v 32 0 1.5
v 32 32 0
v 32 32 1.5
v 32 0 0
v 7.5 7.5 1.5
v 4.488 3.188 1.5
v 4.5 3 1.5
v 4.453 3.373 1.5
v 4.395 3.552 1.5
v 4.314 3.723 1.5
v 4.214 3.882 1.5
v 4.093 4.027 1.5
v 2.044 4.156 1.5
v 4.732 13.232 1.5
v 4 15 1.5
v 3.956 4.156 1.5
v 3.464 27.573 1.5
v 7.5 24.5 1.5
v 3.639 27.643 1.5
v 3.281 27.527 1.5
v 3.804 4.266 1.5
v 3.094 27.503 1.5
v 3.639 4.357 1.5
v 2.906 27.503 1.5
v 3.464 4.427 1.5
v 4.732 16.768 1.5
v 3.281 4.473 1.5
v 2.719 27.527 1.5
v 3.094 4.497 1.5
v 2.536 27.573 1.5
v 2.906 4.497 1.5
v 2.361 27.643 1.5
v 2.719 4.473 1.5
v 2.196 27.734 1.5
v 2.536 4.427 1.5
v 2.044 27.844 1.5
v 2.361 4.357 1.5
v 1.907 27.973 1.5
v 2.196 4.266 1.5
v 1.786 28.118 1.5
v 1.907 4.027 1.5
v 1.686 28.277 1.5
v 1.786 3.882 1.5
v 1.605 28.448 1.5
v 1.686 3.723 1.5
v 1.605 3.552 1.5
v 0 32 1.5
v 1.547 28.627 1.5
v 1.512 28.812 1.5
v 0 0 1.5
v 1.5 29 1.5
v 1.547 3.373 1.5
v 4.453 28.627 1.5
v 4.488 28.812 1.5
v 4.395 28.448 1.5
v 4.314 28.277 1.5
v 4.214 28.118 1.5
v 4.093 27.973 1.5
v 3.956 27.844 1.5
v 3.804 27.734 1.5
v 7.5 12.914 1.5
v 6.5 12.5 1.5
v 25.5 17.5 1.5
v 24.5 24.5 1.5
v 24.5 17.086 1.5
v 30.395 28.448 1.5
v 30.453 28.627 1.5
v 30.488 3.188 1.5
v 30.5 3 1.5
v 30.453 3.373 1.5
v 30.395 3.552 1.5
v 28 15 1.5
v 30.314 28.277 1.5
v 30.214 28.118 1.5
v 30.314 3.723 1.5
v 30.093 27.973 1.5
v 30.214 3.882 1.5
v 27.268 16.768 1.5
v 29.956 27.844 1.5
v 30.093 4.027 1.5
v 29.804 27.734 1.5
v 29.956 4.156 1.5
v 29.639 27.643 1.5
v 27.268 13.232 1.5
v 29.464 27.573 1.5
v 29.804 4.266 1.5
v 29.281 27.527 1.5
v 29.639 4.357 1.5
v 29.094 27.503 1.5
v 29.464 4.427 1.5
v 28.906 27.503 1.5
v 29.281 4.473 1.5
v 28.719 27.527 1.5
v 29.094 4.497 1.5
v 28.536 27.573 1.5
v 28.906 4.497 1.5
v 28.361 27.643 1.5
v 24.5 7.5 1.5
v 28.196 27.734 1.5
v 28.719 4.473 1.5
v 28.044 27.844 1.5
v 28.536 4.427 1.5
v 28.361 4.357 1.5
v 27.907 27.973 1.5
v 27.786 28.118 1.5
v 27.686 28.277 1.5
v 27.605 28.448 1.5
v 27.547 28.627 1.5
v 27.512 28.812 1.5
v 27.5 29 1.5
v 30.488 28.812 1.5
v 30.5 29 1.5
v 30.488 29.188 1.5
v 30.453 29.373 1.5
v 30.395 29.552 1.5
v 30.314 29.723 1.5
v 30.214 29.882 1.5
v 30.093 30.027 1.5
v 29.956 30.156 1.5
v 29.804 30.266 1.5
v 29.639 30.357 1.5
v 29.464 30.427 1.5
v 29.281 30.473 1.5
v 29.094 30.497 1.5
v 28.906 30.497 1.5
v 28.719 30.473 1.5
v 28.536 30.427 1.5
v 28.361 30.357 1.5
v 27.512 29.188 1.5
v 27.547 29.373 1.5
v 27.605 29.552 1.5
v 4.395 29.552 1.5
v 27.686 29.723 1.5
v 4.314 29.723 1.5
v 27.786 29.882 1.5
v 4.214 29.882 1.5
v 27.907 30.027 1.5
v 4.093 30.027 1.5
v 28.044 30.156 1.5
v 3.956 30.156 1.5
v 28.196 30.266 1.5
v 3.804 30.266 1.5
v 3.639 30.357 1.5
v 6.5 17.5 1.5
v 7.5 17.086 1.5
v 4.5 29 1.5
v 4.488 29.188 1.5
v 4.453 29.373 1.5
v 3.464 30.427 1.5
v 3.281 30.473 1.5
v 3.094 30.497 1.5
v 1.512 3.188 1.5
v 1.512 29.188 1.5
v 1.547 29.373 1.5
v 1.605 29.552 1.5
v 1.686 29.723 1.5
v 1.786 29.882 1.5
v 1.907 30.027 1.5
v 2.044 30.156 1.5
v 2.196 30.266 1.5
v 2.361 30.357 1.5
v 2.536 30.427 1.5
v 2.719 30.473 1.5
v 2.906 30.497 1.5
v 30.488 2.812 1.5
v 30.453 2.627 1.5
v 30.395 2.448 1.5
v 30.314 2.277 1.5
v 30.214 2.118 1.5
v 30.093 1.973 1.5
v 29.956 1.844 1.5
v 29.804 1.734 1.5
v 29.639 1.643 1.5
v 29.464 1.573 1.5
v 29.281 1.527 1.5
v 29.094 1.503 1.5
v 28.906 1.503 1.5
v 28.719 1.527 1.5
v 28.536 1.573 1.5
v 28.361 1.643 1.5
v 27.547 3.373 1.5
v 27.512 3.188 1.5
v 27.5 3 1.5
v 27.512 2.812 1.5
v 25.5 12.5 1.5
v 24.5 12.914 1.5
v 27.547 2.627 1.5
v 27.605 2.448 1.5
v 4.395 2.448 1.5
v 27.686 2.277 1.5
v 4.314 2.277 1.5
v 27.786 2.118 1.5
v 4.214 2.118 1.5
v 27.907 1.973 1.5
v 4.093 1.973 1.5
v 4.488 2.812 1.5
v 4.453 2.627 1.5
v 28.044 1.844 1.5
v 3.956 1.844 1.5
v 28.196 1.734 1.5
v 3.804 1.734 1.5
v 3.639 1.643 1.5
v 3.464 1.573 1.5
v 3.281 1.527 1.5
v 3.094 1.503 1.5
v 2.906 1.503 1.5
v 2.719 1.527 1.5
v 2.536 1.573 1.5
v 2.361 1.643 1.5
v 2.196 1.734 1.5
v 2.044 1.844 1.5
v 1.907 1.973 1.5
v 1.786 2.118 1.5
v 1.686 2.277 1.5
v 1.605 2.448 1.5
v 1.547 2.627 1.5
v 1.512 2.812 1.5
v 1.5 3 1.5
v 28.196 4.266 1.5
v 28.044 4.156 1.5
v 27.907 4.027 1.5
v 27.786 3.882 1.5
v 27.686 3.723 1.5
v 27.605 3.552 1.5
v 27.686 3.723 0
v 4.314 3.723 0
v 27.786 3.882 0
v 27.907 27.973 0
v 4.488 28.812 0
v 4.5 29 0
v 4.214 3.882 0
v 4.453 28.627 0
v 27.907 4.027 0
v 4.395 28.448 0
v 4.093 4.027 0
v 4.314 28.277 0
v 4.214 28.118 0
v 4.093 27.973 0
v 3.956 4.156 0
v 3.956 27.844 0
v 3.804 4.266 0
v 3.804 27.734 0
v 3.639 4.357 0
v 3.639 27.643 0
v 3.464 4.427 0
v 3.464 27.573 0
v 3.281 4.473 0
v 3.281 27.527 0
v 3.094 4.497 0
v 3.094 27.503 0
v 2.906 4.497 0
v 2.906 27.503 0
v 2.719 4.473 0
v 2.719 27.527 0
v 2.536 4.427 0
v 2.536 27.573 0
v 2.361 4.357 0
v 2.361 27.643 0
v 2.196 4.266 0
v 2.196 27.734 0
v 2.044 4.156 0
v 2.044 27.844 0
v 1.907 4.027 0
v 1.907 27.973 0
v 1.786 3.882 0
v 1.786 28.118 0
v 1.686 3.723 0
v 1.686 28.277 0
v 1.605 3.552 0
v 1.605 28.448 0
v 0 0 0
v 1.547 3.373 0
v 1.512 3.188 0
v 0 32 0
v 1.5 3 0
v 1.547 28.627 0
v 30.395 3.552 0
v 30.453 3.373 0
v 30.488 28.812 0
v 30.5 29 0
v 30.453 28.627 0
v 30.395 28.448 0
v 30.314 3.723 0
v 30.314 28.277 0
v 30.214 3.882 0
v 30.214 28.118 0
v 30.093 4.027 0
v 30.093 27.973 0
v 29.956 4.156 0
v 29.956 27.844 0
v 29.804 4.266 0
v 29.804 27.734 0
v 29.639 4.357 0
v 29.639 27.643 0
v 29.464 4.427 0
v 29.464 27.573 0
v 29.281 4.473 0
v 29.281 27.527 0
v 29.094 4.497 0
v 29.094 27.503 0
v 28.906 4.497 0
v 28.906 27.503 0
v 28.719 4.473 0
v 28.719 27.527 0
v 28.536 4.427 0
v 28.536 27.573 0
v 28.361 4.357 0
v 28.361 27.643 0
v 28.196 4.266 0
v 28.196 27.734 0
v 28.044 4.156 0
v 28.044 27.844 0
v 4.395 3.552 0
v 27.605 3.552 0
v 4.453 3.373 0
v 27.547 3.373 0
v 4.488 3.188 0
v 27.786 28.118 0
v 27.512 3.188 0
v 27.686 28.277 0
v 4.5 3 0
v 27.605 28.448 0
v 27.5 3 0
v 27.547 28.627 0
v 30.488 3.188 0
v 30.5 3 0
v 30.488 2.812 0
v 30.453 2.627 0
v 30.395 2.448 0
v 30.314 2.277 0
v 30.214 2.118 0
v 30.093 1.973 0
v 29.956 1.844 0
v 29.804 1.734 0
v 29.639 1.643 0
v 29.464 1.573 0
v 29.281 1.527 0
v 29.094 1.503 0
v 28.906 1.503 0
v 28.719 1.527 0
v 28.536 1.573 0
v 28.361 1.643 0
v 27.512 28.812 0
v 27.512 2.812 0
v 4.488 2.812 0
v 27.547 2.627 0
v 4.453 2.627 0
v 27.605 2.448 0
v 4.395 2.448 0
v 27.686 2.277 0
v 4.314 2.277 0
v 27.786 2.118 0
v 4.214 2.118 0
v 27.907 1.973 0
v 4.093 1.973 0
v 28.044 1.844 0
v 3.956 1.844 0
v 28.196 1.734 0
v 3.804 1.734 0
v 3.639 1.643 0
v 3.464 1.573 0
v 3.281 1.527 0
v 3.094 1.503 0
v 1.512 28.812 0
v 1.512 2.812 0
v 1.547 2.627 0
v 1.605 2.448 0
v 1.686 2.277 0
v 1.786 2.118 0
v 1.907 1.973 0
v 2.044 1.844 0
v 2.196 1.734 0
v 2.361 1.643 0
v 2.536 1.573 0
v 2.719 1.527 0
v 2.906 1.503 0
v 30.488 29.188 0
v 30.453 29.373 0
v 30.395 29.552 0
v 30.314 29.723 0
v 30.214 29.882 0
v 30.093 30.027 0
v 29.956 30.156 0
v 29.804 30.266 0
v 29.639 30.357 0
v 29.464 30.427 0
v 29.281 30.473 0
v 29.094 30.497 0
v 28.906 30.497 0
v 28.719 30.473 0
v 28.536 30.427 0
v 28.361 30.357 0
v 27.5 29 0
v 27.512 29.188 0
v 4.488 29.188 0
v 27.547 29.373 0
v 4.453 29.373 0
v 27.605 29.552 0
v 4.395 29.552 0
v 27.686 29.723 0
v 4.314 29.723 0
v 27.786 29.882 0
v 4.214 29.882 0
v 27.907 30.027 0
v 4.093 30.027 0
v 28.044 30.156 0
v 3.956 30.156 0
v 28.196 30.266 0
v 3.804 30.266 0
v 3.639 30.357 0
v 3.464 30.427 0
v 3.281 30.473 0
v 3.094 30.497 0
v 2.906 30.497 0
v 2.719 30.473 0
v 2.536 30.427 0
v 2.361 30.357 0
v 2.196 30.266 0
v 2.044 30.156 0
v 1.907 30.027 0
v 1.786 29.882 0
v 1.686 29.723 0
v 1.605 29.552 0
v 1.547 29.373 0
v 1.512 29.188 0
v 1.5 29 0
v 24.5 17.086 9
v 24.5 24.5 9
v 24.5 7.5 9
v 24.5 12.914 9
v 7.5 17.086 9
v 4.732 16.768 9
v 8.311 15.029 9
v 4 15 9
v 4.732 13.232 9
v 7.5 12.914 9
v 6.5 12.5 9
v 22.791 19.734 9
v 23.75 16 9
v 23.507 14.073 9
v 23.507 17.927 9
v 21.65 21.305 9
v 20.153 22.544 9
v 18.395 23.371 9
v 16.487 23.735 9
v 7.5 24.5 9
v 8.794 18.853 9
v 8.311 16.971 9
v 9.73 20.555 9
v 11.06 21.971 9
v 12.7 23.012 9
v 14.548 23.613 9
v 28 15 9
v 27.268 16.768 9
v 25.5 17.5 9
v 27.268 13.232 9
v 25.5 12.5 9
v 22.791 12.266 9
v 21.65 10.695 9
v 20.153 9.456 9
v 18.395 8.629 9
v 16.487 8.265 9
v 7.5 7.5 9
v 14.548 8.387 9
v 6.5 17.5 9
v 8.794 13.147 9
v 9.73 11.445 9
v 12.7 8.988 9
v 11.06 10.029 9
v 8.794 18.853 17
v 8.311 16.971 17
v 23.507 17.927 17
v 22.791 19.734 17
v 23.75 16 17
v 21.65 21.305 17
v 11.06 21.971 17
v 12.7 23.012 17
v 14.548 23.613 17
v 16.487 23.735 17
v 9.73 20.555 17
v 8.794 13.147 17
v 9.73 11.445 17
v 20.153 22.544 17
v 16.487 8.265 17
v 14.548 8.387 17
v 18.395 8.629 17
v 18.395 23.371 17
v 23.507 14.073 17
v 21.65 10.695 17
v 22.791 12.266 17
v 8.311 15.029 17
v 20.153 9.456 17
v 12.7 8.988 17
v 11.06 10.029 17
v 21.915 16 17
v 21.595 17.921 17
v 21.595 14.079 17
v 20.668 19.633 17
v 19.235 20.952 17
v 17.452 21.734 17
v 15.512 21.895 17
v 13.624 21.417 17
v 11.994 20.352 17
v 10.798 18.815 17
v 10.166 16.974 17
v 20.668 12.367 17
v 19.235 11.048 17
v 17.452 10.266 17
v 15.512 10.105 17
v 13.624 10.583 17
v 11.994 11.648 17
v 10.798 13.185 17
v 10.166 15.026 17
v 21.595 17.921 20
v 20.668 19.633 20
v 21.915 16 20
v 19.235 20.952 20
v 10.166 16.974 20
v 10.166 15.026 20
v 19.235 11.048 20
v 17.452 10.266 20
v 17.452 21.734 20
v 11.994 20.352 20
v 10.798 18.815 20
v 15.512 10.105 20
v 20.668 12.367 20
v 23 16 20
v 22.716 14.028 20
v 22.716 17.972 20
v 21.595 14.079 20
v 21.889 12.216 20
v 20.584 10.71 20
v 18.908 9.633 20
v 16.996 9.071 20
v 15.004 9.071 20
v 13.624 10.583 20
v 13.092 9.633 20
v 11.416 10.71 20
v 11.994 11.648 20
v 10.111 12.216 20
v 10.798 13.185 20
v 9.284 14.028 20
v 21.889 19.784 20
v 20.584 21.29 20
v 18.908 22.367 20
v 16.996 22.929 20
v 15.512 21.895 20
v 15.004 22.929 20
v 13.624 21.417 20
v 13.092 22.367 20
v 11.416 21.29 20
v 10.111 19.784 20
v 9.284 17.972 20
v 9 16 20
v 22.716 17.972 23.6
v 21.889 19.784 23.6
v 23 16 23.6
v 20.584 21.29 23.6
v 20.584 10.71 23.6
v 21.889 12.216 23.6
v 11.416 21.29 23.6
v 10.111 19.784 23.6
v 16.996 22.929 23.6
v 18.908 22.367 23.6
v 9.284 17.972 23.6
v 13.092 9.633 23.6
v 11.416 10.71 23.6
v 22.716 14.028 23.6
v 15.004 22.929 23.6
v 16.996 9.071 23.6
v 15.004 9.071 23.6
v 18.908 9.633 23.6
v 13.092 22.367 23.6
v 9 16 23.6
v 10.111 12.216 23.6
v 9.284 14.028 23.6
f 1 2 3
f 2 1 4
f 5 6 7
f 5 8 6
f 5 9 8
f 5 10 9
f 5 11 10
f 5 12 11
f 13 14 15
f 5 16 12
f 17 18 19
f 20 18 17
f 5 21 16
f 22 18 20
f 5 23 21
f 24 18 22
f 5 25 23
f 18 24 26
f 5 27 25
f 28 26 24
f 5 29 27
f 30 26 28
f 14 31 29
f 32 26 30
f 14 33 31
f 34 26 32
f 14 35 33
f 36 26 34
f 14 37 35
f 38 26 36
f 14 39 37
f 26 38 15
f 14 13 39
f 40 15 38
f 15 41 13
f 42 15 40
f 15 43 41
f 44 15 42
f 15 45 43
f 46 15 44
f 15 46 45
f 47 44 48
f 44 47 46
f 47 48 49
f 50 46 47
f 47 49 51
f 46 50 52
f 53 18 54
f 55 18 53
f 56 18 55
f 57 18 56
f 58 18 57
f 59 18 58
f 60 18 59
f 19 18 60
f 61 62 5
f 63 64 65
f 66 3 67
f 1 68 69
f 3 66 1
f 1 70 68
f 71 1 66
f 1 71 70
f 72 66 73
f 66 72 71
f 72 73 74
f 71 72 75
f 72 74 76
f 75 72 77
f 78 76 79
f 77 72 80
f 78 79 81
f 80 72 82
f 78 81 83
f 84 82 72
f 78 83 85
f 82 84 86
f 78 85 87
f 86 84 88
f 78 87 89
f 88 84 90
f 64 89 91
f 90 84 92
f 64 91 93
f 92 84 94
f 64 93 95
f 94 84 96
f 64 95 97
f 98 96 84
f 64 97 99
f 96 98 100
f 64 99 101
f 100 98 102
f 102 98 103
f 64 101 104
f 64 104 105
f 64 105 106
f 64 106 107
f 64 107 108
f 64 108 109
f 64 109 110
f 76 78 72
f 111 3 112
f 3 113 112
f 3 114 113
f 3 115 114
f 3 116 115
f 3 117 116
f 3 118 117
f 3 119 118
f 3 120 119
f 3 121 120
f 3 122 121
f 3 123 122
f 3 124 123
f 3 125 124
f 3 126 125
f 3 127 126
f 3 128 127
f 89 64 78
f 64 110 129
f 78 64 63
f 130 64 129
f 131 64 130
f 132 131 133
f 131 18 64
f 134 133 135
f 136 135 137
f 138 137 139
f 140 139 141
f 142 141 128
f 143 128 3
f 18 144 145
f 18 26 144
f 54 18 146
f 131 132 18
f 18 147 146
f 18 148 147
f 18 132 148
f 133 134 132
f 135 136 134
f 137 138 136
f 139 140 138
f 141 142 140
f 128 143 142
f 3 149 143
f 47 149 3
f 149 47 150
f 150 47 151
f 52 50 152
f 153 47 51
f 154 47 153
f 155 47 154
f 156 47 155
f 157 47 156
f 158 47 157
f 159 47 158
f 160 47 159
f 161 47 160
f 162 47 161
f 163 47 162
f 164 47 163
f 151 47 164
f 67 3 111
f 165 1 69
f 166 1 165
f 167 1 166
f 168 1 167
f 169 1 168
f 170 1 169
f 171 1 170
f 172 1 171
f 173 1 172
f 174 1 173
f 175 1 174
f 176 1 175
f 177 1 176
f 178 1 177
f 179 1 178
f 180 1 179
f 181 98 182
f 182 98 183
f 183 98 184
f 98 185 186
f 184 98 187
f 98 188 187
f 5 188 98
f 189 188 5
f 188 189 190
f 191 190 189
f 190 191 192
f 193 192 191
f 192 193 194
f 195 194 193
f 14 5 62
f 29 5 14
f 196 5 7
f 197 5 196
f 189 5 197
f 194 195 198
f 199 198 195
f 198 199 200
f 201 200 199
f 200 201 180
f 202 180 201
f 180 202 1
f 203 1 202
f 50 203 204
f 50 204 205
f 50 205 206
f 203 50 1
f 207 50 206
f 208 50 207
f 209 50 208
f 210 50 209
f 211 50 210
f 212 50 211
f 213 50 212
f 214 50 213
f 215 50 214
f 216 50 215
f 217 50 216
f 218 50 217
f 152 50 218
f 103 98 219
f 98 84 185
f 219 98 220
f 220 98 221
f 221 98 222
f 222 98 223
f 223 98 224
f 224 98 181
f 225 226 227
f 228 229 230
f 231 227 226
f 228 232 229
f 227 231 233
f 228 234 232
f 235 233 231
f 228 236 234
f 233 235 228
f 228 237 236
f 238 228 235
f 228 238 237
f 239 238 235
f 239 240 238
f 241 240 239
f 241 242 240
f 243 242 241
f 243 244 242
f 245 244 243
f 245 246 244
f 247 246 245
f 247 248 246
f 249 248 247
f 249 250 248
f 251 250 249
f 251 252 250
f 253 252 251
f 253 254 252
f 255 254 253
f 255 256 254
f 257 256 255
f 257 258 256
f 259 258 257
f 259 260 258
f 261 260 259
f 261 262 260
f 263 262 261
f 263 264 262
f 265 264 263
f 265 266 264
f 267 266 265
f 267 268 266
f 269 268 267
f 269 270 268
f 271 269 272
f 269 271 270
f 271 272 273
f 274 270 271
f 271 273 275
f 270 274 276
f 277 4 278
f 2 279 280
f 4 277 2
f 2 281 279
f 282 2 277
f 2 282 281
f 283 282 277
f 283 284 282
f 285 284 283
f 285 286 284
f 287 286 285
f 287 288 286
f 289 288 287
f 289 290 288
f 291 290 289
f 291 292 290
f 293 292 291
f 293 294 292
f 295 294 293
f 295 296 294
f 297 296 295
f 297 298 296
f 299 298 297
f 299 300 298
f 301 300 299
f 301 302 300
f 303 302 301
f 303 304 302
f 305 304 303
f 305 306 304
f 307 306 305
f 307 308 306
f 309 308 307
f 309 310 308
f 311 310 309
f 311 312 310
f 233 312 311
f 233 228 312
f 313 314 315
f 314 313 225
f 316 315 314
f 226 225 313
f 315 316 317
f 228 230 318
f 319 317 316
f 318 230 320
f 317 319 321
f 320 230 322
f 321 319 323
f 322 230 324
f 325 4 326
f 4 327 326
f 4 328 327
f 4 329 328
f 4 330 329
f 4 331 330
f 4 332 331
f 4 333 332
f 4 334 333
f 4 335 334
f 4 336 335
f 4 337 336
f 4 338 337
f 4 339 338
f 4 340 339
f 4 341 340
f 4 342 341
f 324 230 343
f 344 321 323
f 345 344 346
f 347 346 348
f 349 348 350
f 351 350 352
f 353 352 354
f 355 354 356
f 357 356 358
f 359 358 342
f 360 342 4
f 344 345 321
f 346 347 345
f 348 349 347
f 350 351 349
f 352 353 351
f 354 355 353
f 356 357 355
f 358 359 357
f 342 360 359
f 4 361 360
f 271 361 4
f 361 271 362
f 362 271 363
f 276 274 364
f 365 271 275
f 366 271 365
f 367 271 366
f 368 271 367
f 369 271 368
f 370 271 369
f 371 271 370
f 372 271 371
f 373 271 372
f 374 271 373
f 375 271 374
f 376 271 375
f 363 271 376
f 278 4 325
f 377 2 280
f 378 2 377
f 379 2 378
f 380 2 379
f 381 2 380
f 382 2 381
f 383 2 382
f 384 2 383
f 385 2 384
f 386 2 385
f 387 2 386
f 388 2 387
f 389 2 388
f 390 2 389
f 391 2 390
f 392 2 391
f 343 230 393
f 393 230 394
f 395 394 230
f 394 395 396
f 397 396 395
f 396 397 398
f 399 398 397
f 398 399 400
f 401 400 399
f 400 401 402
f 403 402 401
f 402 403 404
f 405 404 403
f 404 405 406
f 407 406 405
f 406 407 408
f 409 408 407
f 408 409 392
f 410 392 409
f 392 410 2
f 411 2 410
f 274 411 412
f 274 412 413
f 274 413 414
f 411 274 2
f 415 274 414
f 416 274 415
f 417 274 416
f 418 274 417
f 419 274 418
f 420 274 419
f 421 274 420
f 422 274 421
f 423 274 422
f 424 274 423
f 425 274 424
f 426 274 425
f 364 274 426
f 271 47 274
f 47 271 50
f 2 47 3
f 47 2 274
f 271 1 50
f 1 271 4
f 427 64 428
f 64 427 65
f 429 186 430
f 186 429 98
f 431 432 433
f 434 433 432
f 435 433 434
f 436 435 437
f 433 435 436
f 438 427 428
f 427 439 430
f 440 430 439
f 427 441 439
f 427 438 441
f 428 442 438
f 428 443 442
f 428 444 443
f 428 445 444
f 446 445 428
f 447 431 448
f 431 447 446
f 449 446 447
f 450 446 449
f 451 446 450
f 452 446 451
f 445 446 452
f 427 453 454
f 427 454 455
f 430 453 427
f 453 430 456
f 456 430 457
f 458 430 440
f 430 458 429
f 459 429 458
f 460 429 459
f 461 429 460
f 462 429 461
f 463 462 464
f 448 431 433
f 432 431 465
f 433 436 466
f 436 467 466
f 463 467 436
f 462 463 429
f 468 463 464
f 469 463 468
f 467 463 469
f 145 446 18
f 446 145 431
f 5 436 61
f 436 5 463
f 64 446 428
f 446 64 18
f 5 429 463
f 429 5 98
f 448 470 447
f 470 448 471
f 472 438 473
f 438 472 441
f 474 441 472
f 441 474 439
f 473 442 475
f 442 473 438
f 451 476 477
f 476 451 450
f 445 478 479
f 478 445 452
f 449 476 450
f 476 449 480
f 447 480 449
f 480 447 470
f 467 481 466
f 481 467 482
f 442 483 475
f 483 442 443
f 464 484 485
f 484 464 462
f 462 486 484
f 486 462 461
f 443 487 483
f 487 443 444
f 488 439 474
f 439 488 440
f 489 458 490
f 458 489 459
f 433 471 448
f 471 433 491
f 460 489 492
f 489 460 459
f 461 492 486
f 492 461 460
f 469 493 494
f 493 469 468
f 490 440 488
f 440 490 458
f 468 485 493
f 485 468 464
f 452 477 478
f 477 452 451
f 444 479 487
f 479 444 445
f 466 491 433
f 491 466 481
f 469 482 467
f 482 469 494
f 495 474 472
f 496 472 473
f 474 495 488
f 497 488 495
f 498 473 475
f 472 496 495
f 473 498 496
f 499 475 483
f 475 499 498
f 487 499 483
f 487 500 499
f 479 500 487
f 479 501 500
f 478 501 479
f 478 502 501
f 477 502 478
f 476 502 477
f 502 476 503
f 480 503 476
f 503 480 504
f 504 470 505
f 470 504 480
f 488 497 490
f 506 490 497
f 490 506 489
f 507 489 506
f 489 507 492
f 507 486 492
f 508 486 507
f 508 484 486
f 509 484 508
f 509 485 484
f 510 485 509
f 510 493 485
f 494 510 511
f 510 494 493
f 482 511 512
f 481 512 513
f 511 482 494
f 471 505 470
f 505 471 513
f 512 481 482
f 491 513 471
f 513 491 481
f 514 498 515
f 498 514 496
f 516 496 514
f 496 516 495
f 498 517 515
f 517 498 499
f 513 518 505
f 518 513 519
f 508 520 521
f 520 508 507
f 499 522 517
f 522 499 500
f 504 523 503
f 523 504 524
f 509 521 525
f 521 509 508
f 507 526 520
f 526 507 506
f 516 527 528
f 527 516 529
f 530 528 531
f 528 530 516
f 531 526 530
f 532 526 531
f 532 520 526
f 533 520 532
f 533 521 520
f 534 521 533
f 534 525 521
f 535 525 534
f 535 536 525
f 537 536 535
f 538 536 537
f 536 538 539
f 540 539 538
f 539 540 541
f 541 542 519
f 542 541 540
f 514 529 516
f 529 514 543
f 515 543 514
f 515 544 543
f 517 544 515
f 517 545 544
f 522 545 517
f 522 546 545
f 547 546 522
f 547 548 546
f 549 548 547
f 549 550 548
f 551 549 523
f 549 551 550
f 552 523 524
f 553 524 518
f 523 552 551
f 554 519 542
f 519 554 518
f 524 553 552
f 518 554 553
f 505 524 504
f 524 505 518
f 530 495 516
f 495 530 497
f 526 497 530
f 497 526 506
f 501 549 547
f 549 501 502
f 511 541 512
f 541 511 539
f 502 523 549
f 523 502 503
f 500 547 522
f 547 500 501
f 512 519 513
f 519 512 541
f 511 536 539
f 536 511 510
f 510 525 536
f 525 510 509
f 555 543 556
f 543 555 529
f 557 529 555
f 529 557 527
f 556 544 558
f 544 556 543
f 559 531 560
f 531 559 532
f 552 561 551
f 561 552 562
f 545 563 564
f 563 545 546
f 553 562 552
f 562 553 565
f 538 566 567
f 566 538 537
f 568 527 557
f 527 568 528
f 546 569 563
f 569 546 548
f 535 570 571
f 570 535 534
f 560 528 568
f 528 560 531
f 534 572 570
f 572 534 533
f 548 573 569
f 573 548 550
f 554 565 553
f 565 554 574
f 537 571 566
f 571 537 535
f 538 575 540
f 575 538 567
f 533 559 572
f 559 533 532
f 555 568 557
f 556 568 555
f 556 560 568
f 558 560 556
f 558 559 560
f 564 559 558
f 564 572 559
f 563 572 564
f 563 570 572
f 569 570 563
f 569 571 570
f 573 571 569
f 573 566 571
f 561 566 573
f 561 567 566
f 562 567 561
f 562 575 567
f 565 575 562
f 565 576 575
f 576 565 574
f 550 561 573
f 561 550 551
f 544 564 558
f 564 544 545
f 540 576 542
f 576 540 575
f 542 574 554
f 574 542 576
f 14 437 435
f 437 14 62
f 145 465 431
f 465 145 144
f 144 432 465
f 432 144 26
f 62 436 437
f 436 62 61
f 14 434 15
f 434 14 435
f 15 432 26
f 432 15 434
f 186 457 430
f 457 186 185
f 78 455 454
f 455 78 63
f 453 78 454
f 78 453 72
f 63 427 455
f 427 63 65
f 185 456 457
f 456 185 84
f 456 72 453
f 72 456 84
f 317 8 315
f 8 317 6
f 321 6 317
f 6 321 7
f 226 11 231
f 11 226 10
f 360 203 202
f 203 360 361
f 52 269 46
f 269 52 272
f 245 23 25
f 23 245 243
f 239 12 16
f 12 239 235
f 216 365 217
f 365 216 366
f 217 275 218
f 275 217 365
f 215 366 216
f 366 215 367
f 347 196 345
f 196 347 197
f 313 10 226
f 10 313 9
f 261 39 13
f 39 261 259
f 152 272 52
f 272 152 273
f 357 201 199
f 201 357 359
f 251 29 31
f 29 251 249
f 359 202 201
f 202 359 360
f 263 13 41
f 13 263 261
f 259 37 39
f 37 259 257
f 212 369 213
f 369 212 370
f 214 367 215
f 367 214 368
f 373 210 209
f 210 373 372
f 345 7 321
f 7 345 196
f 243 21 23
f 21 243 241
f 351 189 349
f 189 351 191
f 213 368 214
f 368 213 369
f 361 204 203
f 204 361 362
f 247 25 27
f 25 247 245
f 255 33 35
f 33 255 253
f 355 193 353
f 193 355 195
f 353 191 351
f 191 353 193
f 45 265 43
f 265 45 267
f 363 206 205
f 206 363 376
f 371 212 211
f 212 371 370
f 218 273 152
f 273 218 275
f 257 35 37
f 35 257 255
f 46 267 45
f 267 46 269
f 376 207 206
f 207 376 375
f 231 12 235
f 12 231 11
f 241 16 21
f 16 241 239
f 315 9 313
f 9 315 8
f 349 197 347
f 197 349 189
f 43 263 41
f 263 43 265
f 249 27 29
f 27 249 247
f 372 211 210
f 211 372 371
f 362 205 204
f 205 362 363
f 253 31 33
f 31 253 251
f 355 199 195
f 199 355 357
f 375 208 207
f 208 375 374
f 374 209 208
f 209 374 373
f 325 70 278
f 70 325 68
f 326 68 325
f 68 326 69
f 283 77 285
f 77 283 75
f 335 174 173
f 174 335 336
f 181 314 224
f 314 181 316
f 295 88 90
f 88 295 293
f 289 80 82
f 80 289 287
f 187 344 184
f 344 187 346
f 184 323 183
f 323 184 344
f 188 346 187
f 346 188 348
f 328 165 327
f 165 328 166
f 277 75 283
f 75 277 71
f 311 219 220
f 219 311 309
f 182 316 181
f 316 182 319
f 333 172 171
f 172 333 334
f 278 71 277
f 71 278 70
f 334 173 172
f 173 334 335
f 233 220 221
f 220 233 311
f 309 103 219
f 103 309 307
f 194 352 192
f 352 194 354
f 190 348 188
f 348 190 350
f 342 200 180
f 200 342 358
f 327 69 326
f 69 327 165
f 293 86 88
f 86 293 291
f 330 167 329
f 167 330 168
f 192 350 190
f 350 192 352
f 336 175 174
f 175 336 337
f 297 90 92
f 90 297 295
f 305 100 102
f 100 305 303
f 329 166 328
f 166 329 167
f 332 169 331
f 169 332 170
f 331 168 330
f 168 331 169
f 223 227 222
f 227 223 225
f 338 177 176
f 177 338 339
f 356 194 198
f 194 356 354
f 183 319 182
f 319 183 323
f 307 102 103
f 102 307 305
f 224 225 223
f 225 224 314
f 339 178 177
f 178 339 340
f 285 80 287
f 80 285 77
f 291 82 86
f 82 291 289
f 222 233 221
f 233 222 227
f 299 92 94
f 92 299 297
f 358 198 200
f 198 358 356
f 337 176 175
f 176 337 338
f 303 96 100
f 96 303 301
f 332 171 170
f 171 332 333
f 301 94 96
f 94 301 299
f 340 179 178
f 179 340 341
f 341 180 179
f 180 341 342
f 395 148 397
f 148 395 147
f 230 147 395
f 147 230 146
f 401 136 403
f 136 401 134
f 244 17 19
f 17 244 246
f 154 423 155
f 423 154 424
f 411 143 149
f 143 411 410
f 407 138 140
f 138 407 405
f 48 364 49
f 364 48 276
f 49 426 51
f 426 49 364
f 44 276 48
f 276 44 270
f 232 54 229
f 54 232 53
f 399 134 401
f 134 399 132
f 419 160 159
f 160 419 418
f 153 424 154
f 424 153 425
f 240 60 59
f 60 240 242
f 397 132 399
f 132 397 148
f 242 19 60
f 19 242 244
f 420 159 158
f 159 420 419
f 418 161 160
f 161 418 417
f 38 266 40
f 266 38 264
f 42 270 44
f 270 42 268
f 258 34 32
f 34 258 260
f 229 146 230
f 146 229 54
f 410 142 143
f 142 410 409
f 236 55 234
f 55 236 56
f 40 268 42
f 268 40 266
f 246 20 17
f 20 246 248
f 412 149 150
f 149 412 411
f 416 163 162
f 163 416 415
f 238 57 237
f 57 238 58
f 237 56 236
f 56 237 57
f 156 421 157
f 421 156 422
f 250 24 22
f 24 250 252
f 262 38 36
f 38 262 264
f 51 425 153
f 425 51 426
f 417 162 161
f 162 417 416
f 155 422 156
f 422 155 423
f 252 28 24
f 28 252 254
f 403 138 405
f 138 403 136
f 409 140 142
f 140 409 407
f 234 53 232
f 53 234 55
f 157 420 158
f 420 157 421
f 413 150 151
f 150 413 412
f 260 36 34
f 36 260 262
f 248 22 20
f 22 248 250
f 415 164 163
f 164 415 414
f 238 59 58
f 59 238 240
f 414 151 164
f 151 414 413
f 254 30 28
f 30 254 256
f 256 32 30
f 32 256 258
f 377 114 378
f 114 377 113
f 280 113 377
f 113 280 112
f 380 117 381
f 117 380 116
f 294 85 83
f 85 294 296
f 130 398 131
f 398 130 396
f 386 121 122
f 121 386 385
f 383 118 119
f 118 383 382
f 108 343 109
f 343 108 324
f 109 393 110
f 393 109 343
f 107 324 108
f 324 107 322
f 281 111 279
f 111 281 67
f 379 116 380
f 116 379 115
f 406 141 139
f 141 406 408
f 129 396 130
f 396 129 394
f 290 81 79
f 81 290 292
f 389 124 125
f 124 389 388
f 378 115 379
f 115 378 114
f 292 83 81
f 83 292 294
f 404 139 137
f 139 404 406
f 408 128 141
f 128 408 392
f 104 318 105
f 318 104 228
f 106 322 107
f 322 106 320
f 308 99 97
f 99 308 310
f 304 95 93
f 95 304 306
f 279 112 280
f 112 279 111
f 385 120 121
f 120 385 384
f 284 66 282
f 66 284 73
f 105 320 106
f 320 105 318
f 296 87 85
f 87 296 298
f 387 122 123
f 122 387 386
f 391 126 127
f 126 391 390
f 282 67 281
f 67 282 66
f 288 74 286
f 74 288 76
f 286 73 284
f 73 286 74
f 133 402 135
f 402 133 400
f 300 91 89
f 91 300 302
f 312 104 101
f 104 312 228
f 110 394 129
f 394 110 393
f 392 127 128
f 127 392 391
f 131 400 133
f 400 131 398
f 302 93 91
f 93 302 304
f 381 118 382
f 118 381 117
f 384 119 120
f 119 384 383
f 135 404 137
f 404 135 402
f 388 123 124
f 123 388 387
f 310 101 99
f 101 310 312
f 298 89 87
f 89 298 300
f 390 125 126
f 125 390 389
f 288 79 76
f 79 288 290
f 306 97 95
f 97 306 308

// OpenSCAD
board_w = 32;
board_d = 32;
board_h = 1.5;

cam_w = 17;
cam_d = 17;
cam_h = 7.5;

difference () {
    union () {
        // board
        cube ([board_w,board_d,board_h]);
        //cam_body
        translate([(board_w-cam_w)/2,(board_d-cam_d)/2,board_h]) cube([cam_w,cam_d,cam_h]);
        translate([board_w/2,board_d/2,board_h+cam_h+(5.5/2)]) cylinder (h=5.5, d=15.5,center=true);
        // lock ring
        translate([board_w/2,board_d/2,board_h+cam_h+5.5+(2.5/2)]) cylinder (h=2.5, d=15.5,center=true);
        // lens_shaft
        translate([board_w/2,board_d/2,board_h+cam_h+5.5+2.5+(3/2)]) cylinder (h=3, d=11.83,center=true);
        // lens body
        translate([board_w/2,board_d/2,board_h+cam_h+5.5+2.5+3+(3.6/2)]) cylinder (h=3.6, d=14,center=true);
        translate([(board_w-cam_w)/2-1,(board_d-cam_d),cam_h/2+board_h]) cylinder(h=cam_h, d=5, center=true);
        translate([(board_w-cam_w)/2+1+cam_w,(board_d-cam_d),cam_h/2+board_h]) cylinder(h=cam_h, d=5, center=true);
    }
    translate([3,3,2]) cylinder(d=3,h=5, center=true, $fn=50);
    translate([board_w-3,3,2]) cylinder(d=3,h=5, center=true, $fn=50);
    translate([3,board_d-3,2]) cylinder(d=3,h=5, center=true, $fn=50);
    translate([board_w-3,board_d-3,2]) cylinder(d=3,h=5, center=true, $fn=50);
}
